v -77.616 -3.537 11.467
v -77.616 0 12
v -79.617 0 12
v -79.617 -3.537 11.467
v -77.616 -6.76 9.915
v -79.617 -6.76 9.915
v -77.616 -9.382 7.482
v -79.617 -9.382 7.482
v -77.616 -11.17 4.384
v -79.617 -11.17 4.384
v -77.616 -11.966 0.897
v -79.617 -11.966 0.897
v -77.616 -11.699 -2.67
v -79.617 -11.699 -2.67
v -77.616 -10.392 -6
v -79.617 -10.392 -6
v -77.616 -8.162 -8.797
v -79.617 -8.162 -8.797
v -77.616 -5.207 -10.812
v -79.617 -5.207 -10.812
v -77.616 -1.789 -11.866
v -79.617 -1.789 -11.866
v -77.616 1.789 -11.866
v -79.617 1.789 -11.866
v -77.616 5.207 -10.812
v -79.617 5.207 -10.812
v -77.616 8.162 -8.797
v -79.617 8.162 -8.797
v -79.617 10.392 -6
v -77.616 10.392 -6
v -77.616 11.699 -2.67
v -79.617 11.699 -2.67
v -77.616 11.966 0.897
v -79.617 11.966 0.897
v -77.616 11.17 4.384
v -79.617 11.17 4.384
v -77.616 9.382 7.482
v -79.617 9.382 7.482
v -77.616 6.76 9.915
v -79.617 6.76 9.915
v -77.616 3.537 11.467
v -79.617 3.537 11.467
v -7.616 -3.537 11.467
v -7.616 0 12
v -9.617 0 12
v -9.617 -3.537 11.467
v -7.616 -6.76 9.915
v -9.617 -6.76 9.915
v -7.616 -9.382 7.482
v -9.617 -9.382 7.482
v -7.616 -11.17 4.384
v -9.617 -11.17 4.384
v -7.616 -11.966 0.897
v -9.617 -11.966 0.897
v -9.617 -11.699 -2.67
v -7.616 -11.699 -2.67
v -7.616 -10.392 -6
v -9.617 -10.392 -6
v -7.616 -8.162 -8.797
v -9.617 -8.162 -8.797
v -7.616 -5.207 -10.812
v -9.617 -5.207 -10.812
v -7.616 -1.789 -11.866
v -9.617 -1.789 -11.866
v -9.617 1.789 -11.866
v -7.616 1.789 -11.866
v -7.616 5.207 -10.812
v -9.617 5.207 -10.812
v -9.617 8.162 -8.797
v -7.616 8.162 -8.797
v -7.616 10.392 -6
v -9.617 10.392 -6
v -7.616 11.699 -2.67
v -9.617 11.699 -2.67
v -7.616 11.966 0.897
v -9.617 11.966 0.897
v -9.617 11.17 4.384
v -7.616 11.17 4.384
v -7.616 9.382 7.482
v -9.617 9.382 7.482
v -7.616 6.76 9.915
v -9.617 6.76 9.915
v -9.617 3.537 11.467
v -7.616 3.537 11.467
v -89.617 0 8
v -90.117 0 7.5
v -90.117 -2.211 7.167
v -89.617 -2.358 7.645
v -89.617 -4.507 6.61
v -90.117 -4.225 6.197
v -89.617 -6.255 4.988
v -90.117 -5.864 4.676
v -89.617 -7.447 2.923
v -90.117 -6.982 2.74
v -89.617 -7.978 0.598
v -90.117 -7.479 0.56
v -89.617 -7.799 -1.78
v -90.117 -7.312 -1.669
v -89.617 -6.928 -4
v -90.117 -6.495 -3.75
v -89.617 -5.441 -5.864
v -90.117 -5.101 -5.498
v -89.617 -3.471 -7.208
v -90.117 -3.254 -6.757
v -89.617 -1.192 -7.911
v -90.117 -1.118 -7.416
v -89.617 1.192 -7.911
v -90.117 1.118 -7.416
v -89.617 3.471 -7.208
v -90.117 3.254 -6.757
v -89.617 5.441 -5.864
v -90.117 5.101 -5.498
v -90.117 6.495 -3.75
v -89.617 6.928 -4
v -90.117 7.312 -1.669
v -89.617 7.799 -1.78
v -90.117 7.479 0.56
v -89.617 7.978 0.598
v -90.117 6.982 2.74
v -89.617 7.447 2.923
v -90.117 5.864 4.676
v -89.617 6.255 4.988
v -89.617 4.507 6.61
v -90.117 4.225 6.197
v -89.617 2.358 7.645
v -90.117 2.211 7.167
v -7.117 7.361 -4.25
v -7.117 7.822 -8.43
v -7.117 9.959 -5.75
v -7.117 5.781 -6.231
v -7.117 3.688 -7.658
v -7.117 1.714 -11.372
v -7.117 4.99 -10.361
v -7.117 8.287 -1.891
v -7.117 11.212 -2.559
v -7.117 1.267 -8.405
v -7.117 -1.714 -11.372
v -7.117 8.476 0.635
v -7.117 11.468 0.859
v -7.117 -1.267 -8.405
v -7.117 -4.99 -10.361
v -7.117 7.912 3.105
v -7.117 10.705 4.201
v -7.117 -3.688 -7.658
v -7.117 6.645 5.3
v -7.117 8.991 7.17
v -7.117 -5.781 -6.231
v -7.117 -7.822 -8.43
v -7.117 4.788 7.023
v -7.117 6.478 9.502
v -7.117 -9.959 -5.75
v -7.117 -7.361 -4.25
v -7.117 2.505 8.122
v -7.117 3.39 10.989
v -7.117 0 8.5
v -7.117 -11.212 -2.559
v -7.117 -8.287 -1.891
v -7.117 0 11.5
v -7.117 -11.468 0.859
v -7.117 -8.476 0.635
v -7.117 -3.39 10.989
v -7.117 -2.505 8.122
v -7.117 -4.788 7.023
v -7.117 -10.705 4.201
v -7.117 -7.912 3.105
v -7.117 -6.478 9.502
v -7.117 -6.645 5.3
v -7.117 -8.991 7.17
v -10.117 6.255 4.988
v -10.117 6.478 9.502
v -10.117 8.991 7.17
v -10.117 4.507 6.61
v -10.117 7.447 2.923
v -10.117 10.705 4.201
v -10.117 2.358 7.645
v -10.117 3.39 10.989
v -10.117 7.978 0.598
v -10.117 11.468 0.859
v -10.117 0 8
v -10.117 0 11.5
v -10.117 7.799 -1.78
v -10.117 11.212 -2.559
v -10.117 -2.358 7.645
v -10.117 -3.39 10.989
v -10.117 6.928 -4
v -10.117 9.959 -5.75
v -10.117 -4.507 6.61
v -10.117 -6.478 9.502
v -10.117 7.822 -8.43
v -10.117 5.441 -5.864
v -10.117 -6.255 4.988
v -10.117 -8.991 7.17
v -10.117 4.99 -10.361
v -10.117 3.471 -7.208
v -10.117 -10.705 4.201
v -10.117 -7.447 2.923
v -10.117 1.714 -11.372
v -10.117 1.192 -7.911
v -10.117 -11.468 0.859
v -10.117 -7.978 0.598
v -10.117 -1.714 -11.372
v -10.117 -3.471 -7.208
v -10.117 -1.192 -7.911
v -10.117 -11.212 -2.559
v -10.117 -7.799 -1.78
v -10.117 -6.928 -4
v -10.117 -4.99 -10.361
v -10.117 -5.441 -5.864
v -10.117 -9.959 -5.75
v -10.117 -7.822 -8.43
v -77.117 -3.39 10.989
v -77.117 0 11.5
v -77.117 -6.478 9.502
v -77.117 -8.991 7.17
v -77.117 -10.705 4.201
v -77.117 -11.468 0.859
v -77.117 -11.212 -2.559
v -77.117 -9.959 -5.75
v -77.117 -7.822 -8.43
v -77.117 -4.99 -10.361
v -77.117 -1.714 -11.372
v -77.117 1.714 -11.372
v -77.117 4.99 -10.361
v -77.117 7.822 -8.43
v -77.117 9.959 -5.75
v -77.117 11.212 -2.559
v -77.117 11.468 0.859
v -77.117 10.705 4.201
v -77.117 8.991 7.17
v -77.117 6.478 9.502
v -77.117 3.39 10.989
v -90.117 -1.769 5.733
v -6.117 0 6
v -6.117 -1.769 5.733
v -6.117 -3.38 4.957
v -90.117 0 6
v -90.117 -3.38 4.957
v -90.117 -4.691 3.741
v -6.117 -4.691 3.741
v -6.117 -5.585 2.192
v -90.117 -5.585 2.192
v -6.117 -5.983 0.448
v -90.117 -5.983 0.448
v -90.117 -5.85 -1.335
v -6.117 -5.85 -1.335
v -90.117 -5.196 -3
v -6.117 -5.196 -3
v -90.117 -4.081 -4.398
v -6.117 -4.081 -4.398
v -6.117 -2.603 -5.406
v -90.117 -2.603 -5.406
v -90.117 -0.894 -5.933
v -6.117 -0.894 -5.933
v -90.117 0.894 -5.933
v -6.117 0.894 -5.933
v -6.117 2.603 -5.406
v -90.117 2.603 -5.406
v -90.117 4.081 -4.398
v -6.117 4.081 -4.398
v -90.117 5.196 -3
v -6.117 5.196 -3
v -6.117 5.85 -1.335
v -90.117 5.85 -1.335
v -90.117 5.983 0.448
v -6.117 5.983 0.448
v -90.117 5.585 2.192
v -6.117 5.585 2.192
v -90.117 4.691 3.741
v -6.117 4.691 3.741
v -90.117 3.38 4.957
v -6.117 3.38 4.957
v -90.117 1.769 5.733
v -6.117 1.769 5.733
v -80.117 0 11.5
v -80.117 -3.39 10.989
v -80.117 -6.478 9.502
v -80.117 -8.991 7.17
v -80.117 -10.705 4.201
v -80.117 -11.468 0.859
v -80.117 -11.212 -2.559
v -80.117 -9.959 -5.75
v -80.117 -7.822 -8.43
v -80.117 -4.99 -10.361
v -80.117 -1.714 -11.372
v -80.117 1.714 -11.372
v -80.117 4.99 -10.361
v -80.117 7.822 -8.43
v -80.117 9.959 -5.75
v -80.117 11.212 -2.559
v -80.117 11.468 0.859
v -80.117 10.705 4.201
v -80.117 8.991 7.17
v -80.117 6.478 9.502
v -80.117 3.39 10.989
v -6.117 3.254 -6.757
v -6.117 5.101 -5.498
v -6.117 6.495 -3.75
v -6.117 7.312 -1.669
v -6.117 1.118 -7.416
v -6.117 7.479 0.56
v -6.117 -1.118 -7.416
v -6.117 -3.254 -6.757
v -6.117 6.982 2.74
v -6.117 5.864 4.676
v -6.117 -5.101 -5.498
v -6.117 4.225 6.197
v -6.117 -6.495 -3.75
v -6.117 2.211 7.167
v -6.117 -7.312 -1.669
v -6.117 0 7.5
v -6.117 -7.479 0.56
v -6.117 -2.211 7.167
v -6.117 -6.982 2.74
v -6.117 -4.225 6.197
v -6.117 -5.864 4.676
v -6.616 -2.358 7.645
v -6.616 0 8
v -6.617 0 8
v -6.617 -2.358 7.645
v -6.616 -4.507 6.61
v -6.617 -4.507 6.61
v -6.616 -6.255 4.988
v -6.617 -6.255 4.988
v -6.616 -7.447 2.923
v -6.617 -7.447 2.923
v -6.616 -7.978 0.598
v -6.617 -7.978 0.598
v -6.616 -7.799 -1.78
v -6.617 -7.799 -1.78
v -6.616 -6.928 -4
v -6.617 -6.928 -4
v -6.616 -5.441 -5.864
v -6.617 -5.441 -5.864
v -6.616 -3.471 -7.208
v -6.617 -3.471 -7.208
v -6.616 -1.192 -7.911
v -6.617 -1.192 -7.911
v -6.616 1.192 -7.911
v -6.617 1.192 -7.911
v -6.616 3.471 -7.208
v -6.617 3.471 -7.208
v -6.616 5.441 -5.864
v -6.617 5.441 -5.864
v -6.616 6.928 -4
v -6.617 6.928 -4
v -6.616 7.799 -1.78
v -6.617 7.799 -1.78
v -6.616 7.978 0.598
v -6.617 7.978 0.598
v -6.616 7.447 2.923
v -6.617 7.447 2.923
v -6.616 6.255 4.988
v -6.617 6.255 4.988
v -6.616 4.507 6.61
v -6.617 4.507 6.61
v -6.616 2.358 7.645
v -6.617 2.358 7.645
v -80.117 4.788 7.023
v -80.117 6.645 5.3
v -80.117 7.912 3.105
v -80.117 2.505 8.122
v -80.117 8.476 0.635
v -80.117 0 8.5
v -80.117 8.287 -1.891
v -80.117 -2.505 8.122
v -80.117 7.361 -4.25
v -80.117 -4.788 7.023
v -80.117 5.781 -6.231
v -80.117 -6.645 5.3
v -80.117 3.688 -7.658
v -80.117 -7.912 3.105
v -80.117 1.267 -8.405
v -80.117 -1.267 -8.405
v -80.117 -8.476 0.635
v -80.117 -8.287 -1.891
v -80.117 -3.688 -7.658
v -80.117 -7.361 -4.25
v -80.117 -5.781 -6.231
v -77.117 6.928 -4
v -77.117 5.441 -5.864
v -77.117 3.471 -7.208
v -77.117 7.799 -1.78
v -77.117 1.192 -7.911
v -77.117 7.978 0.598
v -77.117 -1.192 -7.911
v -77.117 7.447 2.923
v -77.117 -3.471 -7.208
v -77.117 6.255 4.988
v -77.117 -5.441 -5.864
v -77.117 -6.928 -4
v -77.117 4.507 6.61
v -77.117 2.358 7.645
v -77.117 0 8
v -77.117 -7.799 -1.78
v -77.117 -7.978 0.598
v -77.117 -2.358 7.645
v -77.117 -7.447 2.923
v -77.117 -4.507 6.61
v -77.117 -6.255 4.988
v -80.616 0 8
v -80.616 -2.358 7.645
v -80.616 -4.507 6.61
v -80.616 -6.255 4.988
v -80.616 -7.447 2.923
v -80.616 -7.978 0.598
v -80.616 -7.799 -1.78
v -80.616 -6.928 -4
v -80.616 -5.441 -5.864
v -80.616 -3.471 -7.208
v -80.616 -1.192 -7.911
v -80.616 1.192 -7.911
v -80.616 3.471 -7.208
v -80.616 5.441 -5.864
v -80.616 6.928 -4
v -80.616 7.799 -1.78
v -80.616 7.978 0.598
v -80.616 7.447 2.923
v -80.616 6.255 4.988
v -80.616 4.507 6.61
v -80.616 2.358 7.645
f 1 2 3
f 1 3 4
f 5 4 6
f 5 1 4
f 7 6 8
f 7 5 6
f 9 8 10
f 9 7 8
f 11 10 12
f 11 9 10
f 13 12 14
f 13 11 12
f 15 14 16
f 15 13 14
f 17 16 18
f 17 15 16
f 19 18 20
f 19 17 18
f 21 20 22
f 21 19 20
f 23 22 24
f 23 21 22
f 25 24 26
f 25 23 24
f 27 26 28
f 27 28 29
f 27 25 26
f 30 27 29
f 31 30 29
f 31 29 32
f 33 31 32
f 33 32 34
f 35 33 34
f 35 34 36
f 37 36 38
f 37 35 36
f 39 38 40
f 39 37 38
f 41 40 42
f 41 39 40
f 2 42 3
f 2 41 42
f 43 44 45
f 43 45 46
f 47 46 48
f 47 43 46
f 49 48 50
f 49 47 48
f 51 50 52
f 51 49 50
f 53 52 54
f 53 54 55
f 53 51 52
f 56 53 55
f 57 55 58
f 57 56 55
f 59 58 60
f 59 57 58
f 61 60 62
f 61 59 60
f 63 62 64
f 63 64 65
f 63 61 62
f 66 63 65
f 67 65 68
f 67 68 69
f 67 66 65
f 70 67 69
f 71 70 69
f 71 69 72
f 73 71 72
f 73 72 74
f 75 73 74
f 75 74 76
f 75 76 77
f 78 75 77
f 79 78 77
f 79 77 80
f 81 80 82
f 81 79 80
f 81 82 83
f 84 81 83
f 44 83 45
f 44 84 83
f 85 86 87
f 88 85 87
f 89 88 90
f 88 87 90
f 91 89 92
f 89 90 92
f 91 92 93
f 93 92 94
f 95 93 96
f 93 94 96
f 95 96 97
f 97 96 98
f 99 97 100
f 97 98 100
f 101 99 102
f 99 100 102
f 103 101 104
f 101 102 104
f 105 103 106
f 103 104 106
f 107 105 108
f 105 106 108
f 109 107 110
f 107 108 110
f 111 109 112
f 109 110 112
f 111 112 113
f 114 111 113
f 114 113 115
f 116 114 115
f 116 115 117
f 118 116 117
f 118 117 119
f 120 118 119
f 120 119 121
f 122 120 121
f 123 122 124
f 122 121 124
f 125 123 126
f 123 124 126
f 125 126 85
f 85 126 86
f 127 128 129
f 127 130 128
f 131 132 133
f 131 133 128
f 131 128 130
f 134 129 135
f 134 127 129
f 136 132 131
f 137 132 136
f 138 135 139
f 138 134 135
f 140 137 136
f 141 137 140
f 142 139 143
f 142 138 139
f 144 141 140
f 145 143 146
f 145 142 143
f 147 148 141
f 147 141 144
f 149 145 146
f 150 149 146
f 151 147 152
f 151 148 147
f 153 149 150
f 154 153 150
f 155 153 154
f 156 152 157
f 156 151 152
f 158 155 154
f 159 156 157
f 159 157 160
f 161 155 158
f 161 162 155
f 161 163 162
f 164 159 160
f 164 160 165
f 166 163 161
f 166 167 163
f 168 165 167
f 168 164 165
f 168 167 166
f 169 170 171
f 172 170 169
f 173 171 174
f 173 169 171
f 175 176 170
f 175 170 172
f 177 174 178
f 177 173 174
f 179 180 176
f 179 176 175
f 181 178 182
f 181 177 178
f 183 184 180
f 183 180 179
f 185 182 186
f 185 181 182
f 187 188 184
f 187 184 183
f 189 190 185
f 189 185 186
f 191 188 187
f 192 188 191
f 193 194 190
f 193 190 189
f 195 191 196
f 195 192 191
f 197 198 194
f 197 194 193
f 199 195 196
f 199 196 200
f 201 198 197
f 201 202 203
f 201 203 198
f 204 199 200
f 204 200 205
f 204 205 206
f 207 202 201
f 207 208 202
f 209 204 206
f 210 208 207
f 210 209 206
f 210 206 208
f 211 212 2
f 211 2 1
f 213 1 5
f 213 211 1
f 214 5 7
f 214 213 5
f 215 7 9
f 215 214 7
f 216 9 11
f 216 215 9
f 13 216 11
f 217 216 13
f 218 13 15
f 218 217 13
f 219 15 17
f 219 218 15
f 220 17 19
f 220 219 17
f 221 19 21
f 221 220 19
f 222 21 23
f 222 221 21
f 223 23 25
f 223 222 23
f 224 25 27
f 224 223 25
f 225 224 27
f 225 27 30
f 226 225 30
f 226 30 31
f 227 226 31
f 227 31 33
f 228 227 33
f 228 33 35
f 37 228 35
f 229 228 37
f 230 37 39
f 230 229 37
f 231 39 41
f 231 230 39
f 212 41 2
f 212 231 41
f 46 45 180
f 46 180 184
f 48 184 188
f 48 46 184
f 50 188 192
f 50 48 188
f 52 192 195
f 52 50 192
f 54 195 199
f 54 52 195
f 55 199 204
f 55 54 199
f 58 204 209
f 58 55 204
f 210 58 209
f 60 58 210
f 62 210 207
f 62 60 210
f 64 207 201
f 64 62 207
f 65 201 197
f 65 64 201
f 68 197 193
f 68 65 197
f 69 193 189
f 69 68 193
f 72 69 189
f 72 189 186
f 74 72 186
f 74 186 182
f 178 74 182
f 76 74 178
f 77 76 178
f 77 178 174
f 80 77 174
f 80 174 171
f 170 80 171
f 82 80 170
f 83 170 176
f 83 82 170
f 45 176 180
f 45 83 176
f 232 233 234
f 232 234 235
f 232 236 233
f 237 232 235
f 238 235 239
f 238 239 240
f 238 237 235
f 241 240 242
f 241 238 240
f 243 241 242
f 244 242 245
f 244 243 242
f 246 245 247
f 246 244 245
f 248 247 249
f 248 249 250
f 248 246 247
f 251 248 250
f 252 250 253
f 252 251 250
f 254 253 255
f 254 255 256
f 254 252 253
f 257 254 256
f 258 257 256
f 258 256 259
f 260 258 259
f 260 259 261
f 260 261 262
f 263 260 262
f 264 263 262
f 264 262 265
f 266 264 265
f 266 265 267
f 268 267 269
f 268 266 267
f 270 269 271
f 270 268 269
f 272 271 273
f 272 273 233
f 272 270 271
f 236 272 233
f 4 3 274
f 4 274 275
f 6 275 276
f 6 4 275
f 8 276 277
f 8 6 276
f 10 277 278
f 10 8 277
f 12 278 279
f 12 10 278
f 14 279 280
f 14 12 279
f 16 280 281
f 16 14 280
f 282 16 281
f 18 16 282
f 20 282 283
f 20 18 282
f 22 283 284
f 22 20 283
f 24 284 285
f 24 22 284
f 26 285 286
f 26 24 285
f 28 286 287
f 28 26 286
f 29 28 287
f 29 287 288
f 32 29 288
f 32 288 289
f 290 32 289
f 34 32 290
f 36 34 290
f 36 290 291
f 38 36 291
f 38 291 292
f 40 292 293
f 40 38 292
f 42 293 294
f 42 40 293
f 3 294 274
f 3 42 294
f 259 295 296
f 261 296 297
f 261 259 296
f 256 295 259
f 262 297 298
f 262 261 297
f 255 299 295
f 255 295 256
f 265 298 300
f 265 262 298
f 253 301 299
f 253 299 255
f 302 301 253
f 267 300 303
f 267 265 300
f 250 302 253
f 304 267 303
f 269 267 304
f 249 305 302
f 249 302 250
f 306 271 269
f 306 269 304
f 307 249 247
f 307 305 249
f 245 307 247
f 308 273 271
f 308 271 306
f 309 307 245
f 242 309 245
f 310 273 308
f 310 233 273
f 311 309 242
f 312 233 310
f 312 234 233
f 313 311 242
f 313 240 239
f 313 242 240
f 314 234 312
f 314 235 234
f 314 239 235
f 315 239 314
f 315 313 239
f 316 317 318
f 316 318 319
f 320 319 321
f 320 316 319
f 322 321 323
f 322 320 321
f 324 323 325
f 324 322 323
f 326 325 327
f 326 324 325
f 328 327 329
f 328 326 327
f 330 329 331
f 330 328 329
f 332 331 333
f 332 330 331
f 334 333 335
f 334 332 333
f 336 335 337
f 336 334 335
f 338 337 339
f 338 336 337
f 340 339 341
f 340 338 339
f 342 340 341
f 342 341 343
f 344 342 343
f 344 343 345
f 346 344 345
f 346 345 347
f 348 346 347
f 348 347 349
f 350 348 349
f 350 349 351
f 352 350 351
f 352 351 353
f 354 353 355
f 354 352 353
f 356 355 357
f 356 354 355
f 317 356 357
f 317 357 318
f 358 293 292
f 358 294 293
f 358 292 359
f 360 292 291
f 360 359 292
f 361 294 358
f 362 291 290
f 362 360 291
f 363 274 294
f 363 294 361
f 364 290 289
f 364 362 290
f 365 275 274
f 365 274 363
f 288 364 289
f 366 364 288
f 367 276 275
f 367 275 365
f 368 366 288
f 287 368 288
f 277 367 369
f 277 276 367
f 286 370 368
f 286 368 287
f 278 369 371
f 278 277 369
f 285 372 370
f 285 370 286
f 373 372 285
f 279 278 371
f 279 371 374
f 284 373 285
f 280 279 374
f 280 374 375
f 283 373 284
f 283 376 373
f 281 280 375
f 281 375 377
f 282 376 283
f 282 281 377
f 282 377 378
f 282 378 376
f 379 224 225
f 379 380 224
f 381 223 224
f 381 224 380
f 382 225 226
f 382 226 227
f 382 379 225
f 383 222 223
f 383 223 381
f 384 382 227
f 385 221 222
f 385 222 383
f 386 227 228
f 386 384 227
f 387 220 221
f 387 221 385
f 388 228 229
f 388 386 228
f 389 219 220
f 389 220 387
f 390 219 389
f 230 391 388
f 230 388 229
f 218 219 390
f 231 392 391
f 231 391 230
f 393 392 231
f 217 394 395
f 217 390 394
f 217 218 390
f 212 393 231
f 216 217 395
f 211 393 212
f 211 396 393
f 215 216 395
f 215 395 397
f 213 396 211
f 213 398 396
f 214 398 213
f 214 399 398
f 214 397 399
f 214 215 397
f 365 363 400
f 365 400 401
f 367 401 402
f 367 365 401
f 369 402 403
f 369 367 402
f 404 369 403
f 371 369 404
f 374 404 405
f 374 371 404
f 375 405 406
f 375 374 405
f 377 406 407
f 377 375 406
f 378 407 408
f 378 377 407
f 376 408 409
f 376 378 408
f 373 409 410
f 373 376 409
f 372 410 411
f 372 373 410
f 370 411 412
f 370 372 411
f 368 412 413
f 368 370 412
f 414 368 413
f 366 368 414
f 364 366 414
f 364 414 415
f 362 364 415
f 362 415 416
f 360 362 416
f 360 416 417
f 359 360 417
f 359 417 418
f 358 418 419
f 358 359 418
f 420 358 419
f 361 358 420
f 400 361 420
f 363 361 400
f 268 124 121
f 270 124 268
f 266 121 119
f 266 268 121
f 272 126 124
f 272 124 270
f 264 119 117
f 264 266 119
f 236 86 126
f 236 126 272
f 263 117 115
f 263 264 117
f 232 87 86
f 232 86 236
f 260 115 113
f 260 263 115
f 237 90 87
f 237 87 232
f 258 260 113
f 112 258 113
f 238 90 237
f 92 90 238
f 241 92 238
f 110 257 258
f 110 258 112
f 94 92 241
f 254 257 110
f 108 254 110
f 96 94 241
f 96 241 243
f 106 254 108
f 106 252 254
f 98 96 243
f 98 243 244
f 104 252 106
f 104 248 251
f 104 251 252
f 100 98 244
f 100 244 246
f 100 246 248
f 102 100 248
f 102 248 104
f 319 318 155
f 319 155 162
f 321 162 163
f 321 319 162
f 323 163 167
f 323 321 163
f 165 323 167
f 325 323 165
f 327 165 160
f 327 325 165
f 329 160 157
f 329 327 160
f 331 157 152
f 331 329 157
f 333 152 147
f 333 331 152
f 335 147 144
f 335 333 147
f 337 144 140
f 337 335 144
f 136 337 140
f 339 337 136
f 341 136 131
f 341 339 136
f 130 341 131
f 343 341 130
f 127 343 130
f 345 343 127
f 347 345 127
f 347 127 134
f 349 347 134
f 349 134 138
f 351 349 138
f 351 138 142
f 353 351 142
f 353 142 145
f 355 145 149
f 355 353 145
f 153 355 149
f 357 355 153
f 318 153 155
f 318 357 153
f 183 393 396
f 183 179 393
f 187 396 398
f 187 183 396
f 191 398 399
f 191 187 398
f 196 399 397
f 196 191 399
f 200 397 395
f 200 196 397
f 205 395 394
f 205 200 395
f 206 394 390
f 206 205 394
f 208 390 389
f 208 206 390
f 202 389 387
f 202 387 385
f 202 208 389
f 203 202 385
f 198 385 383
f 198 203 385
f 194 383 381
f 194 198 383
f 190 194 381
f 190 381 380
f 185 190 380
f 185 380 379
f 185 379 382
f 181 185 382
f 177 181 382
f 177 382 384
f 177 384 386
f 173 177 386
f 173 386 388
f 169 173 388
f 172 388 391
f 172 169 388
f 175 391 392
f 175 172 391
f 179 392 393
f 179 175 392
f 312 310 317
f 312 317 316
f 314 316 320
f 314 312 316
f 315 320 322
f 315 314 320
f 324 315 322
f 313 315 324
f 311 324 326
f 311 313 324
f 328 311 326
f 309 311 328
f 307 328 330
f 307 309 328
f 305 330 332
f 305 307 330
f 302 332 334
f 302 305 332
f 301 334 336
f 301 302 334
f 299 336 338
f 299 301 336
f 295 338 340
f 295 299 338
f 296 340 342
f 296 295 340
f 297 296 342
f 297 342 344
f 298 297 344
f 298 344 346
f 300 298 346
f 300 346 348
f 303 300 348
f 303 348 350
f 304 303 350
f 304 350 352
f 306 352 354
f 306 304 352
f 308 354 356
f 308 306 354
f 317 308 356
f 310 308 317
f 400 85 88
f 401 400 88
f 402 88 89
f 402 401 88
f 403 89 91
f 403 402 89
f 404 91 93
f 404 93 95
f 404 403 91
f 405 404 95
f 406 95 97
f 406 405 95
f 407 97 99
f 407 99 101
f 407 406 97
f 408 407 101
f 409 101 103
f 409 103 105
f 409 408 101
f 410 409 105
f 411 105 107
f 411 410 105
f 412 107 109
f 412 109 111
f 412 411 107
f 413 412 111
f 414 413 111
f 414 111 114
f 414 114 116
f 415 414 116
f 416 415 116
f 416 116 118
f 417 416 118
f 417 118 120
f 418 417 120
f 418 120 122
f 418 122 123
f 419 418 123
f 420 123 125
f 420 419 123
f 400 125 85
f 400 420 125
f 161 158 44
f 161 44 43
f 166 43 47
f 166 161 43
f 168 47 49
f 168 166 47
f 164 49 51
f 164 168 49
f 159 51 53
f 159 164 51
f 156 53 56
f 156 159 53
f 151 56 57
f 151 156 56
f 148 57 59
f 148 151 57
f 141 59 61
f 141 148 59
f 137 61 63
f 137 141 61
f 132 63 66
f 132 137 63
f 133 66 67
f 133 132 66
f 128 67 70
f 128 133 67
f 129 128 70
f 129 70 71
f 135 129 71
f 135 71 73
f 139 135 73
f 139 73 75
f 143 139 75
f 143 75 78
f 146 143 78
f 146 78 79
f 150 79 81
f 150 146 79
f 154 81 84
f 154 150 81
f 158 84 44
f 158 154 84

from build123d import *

# Parameters (mm, degrees)
CHAMFER1_SIZE = 0.5


with BuildPart() as part:
    # Sketch1 → Revolve1 (revolve)
    with BuildSketch(Plane.XY, mode=Mode.PRIVATE) as revolve1_sk:
        Polygon((-90.116565428, 8), (-80.116565428, 8), (-80.116565428, 12), (-77.116565428, 12), (-77.116565428, 8), (-10.116565428, 8), (-10.116565428, 12), (-7.116565428, 12), (-7.116565428, 8), (-6.116565428, 8), (-6.116565428, 6), (-90.116565428, 6), align=None)
    revolve(revolve1_sk.sketch.rotate(Axis((-123.692772778, 0, 0), (1, 0, 0)), 90), axis=Axis((-123.692772778, 0, 0), (1, 0, 0)))

    # Chamfer1
    chamfer1_edges = [part.edges().sort_by_distance(p)[0] for p in [
        (-7.116565428, 0, -12),
        (-10.116565428, 0, -12),
        (-77.116565428, 0, -12),
        (-80.116565428, 0, -12),
        (-80.116565428, 0, -8),
        (-90.116565428, 0, -8),
        (-6.116565428, 0, -8),
        (-7.116565428, 0, -8),
    ]]
    chamfer(chamfer1_edges, length=CHAMFER1_SIZE - 0.0001)  # a hair under: the kernel refuses the full size


solid = part.part
